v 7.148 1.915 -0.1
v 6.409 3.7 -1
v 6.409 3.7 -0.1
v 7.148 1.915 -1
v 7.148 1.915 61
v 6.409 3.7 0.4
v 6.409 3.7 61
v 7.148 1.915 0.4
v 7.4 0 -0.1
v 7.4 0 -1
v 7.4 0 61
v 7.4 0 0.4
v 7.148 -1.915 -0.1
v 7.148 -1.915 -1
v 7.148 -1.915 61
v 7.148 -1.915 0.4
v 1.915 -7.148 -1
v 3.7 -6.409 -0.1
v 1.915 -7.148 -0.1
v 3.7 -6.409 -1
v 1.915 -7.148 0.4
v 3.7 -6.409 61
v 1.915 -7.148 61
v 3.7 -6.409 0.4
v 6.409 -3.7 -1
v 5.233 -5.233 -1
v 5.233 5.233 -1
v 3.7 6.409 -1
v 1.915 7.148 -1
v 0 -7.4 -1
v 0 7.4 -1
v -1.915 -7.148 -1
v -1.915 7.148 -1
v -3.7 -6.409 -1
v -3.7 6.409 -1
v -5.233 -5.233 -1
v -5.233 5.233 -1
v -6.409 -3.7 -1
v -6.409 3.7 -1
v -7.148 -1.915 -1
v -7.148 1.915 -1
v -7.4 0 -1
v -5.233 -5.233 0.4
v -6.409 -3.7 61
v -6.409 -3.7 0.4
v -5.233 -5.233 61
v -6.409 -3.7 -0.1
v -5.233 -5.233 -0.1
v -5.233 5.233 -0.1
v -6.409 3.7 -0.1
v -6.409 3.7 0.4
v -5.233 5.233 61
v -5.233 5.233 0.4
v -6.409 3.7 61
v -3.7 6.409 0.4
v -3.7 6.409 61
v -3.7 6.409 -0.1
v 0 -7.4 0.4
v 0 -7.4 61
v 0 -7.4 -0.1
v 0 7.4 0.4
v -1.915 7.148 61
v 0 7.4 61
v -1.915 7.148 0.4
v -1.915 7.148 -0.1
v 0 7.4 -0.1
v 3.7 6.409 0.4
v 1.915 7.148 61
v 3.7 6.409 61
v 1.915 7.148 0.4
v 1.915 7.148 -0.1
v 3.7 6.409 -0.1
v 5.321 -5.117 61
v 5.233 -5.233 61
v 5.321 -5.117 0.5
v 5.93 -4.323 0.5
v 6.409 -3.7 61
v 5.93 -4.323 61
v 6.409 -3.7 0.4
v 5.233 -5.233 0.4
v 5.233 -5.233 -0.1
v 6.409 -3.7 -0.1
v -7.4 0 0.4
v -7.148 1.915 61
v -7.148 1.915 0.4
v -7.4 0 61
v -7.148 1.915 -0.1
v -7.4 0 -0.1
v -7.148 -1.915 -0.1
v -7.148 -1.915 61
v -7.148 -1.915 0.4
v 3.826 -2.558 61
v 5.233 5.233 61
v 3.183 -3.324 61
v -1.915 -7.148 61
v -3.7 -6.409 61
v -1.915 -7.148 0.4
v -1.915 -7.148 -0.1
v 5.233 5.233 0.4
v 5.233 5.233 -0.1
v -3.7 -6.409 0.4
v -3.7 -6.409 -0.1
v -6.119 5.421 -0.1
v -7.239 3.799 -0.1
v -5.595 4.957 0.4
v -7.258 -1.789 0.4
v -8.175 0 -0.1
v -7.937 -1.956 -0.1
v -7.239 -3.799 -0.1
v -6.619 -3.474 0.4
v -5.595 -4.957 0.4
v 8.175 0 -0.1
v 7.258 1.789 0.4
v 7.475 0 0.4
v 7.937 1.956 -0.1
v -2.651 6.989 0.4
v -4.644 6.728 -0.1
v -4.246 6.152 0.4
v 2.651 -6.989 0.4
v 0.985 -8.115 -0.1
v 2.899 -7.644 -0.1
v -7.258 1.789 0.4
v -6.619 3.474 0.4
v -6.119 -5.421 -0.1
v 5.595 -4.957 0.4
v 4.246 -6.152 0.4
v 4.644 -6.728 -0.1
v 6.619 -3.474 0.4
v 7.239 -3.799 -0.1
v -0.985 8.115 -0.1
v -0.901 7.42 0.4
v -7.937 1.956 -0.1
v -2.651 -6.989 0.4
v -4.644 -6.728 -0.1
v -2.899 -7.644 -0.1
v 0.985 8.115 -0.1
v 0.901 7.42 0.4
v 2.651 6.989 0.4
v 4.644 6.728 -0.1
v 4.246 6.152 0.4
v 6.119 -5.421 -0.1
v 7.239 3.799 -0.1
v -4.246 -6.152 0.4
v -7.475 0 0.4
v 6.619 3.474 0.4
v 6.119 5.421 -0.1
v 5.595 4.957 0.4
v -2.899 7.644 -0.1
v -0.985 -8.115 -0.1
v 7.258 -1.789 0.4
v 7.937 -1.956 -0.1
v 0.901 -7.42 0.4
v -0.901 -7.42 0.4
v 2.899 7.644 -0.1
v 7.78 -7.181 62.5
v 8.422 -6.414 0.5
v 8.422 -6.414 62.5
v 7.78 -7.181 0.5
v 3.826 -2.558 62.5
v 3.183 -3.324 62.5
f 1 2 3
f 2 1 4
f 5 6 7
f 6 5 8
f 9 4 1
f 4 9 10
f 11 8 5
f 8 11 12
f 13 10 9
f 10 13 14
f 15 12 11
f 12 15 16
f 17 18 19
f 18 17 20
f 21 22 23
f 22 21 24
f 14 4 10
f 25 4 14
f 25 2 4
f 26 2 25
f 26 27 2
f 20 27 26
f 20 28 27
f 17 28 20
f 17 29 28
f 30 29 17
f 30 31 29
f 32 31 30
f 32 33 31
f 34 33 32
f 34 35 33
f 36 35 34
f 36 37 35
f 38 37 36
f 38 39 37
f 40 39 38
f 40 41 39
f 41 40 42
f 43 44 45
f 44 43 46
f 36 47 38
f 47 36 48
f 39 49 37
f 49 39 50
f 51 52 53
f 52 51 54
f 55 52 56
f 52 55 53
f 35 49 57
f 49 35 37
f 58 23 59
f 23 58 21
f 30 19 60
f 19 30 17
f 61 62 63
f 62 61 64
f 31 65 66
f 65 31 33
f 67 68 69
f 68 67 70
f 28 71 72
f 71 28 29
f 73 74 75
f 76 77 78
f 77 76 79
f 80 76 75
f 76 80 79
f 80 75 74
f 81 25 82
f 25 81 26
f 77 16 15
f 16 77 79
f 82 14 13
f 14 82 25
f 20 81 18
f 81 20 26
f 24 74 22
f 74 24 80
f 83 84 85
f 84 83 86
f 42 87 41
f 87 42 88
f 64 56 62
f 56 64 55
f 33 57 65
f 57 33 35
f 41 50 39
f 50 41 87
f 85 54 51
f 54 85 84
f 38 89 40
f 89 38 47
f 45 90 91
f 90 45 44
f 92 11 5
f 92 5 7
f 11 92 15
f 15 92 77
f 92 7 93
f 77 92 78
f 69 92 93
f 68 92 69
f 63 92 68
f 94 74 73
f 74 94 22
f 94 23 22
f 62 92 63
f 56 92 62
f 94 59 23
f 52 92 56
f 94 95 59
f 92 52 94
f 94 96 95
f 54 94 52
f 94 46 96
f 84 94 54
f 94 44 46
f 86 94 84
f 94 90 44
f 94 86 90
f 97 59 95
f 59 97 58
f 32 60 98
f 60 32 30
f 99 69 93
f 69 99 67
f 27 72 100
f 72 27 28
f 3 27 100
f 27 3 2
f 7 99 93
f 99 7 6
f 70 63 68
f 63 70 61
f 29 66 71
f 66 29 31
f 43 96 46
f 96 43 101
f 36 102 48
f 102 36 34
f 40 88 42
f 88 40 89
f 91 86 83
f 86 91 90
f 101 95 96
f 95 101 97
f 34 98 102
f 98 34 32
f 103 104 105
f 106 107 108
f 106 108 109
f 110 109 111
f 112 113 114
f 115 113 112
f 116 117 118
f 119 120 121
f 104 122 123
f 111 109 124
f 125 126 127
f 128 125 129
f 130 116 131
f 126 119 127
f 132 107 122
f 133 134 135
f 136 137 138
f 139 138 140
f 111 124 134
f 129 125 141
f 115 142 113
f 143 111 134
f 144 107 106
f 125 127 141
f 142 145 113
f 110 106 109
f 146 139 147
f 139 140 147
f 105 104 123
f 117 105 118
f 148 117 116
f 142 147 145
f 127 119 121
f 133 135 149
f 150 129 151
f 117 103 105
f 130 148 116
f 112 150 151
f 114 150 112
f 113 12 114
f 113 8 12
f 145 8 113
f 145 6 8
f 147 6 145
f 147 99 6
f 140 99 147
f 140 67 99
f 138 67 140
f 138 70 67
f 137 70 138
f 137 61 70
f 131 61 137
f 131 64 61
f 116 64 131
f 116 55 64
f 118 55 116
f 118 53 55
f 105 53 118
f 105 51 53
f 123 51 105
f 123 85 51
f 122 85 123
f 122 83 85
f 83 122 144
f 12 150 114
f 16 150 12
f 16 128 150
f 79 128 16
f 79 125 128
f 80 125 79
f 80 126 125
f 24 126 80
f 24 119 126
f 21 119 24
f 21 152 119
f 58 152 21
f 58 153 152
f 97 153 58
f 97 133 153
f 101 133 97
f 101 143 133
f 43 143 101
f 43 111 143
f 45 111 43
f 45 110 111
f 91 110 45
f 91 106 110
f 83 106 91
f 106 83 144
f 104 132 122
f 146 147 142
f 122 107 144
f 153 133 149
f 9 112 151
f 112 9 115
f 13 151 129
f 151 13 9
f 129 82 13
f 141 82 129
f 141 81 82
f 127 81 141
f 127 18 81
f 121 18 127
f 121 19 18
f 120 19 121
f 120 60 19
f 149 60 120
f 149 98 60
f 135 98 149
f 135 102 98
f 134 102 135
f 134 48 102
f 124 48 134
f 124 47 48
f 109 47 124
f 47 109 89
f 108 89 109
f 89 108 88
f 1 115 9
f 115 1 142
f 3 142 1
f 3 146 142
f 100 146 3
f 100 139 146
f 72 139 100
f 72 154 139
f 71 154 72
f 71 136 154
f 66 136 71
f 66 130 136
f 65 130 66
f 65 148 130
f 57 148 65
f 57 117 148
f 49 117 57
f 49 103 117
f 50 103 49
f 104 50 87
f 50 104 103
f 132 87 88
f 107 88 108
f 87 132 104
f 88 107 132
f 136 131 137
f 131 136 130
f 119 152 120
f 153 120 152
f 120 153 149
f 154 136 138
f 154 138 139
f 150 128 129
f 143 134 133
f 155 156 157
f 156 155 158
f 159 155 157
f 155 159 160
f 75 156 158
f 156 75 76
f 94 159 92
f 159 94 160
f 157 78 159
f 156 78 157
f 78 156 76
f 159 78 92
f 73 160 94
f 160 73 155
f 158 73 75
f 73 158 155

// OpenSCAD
// PRUSA iteration3
// Bearing holders
// GNU GPL v3
// Josef Průša <iam@josefprusa.cz> and contributors
// http://www.reprap.org/wiki/Prusa_Mendel
// http://prusamendel.org

bearing_diameter = 14.95;

module horizontal_bearing_base(bearings=1){
 translate(v=[0,0,6]) cube(size = [24,8+bearings*25,12], center = true);	
}

module horizontal_bearing_holes(bearings=1){
 cutter_lenght = 10+bearings*25;
 one_holder_lenght = 8+25;
 holder_lenght = 8+bearings*25;
 
 // Main bearing cut
 difference(){
  translate(v=[0,0,12]) rotate(a=[90,0,0]) translate(v=[0,0,-cutter_lenght/2]) cylinder(h = cutter_lenght, r=(bearing_diameter/2)+0.2, $fn=50);
  // Bearing retainers
  translate(v=[0,1-holder_lenght/2,3]) cube(size = [24,6,8], center = true);
  translate(v=[0,-1+holder_lenght/2,3]) cube(size = [24,6,8], center = true);
 }
 
 // Ziptie cutouts
 ziptie_cut_ofset = 0;
 for ( i = [0 : bearings-1] ){
  // For easier positioning I move them by half of one 
  // bearing holder then add each bearign lenght and then center again
  translate(v=[0,-holder_lenght/2,0]) translate(v=[0,one_holder_lenght/2+i*25,0]) difference(){
   union(){
    translate(v=[0,2-8.5,12]) rotate(a=[90,0,0]) translate(v=[0,0,0]) cylinder(h = 4, r=11.5, $fn=50);
    translate(v=[0,2+8.5,12]) rotate(a=[90,0,0]) translate(v=[0,0,0]) cylinder(h = 4, r=11.5, $fn=50);
   }
   translate(v=[0,12,12]) rotate(a=[90,0,0]) translate(v=[0,0,0]) cylinder(h = 24, r=9, $fn=50);
  }
 }
 
}
 
module horizontal_bearing_holes_nozip(bearings=1)
{
	cutter_lenght = 10+bearings*25;
	one_holder_lenght = 8+25;
	holder_lenght = 8+bearings*25;
 
	 // Main bearing cut
	 difference()
		{
		  	translate(v=[0,0,12]) rotate(a=[90,0,0]) translate(v=[0,0,-cutter_lenght/2]) cylinder(h = cutter_lenght, r=(bearing_diameter/2)+0.2, $fn=50);
			// Bearing retainers
			translate(v=[0,1-holder_lenght/2,3]) cube(size = [24,6,8], center = true);
			translate(v=[0,-1+holder_lenght/2,3]) cube(size = [24,6,8], center = true);
 		}
}

module horizontal_bearing_holes_nozip_smooth(bearings=1)
{
	cutter_lenght = 10+bearings*25;
	one_holder_lenght = 8+25;
	holder_lenght = 8+bearings*25;
 
	 // Main bearing cut
	 difference()
		{
		  	translate(v=[0,0,12]) rotate(a=[90,0,0]) translate(v=[0,0,-cutter_lenght/2]) cylinder(h = cutter_lenght, r=(bearing_diameter/2)+0.2, $fn=150);
			// Bearing retainers
			translate(v=[0,1-holder_lenght/2,3]) cube(size = [24,6,8], center = true);
			translate(v=[0,-1+holder_lenght/2,3]) cube(size = [24,6,8], center = true);
 		}
}

module horizontal_bearing_holes_smooth_nozip(bearings=1)
{
	cutter_lenght = 10+bearings*25;
	one_holder_lenght = 8+25;
	holder_lenght = 8+bearings*25;
 
	 // Main bearing cut
	 difference()
		{
		  	translate(v=[0,0,12]) rotate(a=[90,0,0]) translate(v=[0,0,-cutter_lenght/2]) cylinder(h = cutter_lenght, r=(bearing_diameter/2)+0.2, $fn=120);
			// Bearing retainers
			translate(v=[0,1-holder_lenght/2,3]) cube(size = [24,6,8], center = true);
			translate(v=[0,-1+holder_lenght/2,3]) cube(size = [24,6,8], center = true);
 		}
}




thinwall = 3;
bearing_size = bearing_diameter + 2 * thinwall;

module vertical_bearing_base(){
 translate(v=[-2-bearing_size/4,0,29]) cube(size = [4+bearing_size/2,bearing_size,58], center = true);
 cylinder(h = 58, r=bearing_size/2, $fn = 250);
}

module vertical_bearing_holes(){
  translate(v=[0,0,-1]) cylinder(h = 62, r=(14.80/2));
  translate(v=[0,0,-0.1]) cylinder(r1=(bearing_diameter/2)+0.7,r2=(bearing_diameter/2), h=0.5);
  rotate(a=[0,0,-40]) translate(v=[bearing_diameter/2-2.9,-0.5,0.5]) cube(size = [thinwall*2,1,62]);

}

//difference(){
//vertical_bearing_base();
vertical_bearing_holes();
//}
//horizontal_bearing_test();
//horizontal_bearing_base(1);
//horizontal_bearing_holes(1);
//horizontal_bearing_holes_nozip(1);
